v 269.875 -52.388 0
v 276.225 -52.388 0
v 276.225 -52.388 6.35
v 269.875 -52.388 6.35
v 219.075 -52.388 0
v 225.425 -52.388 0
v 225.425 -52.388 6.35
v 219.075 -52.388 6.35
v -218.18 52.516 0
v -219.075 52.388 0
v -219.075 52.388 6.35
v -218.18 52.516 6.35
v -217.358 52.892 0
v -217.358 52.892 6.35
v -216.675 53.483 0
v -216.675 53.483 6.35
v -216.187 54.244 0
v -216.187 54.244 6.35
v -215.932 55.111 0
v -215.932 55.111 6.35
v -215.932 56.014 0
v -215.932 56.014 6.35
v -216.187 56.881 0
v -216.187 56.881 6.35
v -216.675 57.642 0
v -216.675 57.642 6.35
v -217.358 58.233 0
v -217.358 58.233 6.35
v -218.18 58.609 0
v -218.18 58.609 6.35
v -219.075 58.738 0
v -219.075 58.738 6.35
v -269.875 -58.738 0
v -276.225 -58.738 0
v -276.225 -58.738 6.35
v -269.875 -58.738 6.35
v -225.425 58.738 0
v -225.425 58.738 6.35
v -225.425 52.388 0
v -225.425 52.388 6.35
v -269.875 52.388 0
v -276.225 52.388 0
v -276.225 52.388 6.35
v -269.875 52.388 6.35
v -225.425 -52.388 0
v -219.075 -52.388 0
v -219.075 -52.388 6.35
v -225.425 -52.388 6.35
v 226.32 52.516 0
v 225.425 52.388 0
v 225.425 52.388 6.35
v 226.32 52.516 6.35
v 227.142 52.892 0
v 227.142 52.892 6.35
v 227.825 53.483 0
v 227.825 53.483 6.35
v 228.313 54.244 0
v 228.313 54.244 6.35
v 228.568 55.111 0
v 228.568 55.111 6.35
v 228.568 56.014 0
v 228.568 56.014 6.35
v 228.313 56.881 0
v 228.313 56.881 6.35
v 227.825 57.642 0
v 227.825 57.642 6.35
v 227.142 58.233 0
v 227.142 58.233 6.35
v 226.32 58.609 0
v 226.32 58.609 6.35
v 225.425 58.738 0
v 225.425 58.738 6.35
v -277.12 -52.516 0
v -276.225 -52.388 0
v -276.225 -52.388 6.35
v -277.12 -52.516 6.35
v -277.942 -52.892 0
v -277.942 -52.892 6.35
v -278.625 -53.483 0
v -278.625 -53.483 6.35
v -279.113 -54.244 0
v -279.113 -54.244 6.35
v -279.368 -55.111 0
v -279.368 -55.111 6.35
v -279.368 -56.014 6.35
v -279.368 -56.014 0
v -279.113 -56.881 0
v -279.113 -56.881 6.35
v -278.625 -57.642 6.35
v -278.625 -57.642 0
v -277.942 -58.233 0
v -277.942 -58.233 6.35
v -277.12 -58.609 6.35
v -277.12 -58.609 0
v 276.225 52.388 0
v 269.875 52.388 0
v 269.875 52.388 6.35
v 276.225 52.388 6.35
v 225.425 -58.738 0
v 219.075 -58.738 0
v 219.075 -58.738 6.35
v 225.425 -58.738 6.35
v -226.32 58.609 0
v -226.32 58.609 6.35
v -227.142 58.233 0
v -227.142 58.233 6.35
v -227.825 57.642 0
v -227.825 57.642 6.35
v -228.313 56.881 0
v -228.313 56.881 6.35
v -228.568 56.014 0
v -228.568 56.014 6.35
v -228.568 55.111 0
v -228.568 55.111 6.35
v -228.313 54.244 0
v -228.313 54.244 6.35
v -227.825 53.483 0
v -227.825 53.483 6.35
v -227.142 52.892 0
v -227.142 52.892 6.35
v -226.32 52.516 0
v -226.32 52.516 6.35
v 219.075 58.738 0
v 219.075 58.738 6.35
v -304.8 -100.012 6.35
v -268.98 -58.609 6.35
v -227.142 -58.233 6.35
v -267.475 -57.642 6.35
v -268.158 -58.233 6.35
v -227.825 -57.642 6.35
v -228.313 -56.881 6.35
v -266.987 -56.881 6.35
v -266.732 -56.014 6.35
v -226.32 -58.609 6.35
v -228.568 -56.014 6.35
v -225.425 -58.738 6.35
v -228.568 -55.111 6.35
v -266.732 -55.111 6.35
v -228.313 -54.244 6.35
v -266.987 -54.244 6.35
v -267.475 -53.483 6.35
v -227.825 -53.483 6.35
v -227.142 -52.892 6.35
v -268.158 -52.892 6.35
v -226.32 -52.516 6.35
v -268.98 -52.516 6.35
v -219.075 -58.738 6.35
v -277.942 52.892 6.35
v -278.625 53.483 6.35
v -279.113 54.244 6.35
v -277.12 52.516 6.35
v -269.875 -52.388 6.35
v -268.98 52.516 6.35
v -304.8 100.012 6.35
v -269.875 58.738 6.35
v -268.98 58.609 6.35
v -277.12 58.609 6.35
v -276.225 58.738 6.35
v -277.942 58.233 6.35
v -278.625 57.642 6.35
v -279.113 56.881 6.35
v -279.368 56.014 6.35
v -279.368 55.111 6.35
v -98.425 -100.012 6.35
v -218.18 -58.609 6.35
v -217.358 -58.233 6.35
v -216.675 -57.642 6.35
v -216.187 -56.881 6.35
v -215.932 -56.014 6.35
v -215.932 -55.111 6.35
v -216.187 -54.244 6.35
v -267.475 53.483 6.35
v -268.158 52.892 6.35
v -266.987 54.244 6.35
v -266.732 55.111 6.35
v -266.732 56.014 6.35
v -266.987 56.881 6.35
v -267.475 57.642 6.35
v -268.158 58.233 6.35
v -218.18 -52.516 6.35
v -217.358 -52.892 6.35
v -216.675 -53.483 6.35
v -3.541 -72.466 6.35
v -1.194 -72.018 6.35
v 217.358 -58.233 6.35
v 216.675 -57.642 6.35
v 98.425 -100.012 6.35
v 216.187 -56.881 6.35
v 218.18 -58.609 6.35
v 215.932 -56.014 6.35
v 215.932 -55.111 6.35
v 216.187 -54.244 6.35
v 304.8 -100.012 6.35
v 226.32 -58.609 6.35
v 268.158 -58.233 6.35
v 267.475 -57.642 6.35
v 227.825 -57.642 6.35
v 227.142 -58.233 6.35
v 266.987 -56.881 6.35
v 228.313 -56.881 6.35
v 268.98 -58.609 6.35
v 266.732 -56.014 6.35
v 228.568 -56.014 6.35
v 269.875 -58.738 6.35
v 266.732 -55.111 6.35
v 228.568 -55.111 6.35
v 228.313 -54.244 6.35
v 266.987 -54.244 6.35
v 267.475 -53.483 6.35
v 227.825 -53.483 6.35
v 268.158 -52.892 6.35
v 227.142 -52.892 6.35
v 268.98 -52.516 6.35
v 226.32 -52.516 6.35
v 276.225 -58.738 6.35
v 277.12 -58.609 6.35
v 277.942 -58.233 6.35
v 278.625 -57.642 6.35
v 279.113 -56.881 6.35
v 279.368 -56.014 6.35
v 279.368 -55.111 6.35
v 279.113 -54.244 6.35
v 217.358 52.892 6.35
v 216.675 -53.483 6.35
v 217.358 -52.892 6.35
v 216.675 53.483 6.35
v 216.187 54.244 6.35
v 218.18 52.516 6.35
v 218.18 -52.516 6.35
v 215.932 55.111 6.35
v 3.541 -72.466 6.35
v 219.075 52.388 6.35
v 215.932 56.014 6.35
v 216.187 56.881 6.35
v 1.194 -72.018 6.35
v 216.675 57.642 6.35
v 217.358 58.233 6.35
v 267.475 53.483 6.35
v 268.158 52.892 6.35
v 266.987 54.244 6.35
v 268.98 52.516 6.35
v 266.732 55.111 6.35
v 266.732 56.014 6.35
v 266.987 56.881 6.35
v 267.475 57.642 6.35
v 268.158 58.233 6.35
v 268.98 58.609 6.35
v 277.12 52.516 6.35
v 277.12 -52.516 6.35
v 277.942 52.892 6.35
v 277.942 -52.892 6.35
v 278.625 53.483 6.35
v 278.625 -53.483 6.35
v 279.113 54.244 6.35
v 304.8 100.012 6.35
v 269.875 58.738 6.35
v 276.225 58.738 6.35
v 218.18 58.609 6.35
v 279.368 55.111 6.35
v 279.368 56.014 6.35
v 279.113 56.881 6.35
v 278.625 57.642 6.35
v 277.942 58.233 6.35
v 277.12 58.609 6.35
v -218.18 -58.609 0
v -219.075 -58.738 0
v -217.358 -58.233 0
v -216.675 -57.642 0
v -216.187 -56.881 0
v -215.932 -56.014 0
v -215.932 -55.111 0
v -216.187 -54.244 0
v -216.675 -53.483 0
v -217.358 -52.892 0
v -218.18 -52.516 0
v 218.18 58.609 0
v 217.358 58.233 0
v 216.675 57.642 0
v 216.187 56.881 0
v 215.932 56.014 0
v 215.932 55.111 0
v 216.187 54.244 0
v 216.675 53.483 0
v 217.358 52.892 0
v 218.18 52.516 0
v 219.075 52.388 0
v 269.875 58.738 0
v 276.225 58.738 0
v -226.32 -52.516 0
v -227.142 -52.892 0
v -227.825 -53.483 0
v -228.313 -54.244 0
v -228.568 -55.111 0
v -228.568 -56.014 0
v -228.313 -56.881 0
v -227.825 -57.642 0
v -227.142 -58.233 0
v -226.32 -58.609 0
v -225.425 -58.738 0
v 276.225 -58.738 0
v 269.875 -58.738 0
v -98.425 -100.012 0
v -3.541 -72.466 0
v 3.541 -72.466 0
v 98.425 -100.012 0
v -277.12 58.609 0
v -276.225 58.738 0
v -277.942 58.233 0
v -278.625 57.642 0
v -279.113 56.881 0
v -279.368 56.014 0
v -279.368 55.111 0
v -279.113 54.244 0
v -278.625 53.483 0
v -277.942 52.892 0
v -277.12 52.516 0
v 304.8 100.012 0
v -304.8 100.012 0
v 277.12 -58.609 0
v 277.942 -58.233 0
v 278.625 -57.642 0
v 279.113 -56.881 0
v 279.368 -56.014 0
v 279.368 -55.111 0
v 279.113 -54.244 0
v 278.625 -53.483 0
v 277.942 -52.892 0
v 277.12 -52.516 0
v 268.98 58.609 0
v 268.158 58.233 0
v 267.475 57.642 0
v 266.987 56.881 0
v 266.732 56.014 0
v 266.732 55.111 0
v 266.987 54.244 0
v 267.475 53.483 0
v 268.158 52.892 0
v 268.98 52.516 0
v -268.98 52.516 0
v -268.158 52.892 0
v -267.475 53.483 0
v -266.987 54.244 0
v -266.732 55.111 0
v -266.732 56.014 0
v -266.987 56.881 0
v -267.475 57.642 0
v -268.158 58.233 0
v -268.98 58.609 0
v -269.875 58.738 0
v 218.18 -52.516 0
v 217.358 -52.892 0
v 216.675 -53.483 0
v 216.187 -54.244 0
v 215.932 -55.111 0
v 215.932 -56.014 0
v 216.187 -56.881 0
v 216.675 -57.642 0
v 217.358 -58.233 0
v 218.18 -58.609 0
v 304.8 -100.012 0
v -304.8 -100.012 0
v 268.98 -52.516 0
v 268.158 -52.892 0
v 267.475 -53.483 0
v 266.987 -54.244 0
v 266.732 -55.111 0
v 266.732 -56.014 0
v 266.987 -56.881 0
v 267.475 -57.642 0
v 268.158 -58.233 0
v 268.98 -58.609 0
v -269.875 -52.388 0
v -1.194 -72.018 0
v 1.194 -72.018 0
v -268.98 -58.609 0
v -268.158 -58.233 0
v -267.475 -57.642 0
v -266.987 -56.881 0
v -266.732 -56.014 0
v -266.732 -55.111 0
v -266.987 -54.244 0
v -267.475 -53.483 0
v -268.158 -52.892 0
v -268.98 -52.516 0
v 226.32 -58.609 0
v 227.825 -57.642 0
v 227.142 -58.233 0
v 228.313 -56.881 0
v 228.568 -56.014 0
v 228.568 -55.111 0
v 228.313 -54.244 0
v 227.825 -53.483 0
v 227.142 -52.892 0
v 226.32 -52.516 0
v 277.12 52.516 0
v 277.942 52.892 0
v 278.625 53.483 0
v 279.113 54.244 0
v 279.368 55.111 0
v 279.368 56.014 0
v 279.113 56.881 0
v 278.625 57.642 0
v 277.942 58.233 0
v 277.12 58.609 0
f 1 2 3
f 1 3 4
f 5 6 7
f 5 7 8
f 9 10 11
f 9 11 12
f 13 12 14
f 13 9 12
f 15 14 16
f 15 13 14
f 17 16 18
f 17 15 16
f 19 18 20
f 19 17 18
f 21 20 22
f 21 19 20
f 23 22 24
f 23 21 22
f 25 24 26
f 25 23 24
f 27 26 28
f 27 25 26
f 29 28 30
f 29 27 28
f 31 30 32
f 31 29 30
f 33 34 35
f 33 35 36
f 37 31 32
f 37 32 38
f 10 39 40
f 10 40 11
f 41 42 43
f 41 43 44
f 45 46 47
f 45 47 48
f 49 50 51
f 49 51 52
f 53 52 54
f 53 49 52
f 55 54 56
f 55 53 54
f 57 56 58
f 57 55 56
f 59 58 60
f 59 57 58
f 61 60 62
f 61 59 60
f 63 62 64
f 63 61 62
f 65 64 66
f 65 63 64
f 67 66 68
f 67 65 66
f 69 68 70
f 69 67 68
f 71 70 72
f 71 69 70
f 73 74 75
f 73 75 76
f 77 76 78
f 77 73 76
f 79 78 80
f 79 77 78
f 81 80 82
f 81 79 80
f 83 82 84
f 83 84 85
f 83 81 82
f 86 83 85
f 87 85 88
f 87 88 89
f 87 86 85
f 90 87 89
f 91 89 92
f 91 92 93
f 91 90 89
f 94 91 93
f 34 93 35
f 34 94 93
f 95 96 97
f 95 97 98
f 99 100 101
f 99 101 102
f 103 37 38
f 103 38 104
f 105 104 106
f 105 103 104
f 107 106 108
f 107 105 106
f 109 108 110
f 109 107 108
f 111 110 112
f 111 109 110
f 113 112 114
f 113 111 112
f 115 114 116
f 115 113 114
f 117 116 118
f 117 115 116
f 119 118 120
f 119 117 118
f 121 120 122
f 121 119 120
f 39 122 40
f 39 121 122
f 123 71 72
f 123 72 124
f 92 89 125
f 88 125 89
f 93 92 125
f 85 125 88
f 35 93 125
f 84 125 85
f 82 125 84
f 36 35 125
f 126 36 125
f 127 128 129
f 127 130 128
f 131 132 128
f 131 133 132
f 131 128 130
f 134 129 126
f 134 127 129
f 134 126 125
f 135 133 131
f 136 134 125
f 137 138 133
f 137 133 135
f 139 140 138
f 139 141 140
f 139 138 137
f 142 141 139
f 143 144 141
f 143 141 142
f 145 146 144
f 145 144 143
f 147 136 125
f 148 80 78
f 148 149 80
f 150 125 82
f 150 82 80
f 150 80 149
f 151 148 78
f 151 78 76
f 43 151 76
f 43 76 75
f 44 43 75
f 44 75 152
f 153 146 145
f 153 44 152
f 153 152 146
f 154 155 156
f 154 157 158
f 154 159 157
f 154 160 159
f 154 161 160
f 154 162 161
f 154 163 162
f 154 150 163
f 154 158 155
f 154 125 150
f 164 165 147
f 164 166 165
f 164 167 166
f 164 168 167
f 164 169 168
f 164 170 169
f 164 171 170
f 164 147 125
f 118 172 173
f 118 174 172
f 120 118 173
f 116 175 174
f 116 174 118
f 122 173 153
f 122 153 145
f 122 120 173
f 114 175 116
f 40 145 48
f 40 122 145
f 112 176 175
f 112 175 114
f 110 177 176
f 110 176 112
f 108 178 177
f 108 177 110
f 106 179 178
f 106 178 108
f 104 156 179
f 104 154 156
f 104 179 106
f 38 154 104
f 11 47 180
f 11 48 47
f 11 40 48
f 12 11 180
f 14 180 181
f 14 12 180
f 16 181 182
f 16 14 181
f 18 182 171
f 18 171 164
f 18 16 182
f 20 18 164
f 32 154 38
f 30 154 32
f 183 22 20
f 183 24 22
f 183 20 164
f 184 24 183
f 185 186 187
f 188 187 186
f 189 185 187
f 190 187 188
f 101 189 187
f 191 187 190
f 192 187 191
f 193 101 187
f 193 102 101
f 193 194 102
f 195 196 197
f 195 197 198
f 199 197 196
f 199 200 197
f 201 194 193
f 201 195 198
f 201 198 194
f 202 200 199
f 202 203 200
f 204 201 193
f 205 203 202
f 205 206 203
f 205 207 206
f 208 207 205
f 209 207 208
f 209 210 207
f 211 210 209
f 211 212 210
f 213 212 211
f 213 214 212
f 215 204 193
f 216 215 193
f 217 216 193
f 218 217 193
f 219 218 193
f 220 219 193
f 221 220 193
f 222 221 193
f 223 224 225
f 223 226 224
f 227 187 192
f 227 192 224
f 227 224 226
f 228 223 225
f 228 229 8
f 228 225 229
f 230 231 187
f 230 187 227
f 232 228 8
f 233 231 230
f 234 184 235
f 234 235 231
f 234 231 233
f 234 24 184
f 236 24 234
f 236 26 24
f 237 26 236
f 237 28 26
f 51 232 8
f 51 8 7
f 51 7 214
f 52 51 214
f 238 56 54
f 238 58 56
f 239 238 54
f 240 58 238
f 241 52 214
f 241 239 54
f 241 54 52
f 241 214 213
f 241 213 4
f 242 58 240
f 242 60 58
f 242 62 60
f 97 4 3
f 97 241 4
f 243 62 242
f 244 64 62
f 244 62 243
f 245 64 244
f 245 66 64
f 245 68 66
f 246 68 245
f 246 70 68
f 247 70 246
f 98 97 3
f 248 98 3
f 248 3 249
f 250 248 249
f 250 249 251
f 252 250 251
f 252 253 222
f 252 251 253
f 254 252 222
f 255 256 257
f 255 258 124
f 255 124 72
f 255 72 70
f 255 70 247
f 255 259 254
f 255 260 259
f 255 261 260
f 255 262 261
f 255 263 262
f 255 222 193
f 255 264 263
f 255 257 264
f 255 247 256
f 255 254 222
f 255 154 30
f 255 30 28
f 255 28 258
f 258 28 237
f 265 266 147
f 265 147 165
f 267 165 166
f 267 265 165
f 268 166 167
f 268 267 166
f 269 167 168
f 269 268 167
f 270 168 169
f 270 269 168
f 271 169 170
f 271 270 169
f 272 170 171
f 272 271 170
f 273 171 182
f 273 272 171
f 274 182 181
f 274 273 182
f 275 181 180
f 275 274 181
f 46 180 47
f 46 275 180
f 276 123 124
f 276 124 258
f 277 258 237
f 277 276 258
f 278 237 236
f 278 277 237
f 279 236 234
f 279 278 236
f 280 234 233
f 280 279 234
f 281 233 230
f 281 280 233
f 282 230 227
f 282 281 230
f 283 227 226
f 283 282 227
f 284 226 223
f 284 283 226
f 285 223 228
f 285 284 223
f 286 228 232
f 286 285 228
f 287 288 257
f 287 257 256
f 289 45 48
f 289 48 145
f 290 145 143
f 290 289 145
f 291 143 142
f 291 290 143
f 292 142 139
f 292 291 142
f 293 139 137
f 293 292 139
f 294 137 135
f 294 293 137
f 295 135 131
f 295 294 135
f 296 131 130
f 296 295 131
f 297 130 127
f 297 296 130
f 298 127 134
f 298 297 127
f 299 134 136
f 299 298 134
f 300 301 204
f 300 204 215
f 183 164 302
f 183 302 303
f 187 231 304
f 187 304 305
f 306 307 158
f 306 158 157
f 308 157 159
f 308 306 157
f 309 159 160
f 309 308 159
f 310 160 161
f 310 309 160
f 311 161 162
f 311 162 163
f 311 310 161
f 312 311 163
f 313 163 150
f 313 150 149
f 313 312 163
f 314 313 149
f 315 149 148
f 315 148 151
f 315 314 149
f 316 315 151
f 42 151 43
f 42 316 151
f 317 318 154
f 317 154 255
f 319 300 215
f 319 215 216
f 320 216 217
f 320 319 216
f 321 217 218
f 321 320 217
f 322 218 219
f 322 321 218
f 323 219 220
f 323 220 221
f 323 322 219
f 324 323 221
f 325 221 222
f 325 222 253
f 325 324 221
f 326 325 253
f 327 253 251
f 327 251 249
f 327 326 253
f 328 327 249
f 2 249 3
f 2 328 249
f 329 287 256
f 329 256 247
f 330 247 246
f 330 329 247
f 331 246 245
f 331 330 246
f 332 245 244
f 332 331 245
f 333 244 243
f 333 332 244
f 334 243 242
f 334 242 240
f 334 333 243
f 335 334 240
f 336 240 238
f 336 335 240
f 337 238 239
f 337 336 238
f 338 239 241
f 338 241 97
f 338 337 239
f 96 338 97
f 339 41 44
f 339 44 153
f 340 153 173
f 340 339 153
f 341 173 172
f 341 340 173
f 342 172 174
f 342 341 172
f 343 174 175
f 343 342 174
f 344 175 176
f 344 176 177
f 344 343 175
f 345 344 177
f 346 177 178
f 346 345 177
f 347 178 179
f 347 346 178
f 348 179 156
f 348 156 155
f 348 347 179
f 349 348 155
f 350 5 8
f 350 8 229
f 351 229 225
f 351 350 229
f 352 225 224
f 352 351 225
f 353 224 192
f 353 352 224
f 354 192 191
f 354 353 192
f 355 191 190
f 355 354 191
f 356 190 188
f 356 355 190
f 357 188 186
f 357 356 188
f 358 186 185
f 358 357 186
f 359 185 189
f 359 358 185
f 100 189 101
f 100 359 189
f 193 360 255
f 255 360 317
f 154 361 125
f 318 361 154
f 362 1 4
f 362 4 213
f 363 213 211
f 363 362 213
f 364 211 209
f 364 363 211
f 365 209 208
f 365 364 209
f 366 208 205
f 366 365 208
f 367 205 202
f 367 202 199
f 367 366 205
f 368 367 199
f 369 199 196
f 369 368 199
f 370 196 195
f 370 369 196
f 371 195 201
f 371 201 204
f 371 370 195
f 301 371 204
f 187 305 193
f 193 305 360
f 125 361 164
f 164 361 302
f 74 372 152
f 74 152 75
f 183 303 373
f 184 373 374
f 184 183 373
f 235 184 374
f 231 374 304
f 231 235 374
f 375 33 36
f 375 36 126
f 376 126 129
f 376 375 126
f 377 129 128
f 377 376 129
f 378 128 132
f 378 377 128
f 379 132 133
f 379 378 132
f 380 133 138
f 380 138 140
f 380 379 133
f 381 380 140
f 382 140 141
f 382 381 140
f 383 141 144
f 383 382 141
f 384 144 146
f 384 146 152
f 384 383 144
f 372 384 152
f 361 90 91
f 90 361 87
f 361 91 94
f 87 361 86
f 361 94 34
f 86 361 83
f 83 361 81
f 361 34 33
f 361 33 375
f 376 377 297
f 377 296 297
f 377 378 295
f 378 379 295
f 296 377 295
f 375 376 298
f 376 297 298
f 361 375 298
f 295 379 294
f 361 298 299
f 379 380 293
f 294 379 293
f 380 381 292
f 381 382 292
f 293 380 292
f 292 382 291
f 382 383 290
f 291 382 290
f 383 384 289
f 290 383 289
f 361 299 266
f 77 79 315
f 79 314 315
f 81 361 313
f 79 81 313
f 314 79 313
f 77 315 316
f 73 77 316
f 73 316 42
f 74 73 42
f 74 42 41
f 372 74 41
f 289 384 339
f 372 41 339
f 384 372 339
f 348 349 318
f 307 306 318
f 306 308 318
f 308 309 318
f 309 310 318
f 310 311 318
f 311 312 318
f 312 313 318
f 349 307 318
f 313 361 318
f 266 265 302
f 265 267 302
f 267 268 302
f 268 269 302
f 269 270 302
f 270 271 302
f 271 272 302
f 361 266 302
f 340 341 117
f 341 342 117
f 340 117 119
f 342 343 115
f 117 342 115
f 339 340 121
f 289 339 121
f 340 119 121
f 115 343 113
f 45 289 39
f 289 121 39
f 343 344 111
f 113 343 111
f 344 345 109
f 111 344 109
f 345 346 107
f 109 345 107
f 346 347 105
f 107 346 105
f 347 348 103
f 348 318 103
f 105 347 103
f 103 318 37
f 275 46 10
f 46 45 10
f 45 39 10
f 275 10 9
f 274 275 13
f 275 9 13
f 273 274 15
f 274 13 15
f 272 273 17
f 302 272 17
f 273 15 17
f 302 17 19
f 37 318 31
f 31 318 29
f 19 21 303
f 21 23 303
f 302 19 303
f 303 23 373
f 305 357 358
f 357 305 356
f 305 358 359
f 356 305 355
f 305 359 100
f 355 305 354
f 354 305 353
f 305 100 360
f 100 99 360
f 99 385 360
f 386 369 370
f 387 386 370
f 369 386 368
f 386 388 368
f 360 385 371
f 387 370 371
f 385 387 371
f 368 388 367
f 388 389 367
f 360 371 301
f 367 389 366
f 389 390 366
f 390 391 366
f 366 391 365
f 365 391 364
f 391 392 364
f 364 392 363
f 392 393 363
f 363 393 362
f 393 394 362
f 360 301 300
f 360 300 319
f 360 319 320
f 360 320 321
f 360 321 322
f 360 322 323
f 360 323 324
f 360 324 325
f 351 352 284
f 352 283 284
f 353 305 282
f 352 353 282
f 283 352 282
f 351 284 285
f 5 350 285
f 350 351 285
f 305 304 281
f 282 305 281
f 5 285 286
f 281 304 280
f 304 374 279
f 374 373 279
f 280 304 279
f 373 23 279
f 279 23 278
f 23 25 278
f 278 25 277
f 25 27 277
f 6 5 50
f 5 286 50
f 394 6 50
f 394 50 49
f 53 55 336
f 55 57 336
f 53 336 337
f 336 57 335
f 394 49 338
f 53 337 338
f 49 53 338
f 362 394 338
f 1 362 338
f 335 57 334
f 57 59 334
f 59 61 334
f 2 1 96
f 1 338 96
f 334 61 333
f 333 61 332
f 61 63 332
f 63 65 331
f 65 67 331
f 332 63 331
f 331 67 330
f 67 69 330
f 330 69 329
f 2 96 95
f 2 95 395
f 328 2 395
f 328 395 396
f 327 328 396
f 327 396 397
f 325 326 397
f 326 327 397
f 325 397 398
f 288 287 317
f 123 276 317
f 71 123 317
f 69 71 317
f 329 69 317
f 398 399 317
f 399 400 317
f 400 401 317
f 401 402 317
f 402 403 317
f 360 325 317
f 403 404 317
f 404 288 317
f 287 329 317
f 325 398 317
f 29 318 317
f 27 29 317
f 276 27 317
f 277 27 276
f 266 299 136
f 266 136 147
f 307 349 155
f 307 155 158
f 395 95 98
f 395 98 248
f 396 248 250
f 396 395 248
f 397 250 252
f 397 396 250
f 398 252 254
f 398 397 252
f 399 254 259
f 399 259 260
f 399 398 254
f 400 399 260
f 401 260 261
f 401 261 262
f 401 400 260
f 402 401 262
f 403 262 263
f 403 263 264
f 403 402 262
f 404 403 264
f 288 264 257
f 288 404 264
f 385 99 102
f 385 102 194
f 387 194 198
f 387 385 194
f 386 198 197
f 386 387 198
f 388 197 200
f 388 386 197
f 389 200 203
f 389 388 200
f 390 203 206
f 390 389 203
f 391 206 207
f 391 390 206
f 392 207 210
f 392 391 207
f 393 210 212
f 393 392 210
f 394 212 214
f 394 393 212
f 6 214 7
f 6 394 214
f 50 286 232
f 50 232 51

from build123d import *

# Parameters (mm, degrees)
SKETCH1_W                       = 609.6
SKETCH1_H                       = 200.025
BOSS_EXTRUDE1_DEPTH             = 6.35
F_1_4_0_25_DIAMETER_SLOT1_DEPTH = 6.35
CUT_EXTRUDE1_DEPTH              = 321.85177677


# Read off the part's stored shape, not the designer's step: 1/4 (0.25) Diameter Slot1
with BuildPart() as part:
    # Sketch1 → Boss-Extrude1 (new body)
    with BuildSketch(Plane.XY):
        Rectangle(SKETCH1_W, SKETCH1_H)
    extrude(amount=BOSS_EXTRUDE1_DEPTH)

    # 1/4 (0.25) Diameter Slot1 outline → 1/4 (0.25) Diameter Slot1 (cut)
    with BuildSketch(Plane.XY):
        with BuildLine():
            Line((219.075, -58.7375), (225.425, -58.7375))
            ThreePointArc((225.425, -58.7375), (228.6, -55.5625), (225.425, -52.3875))
            Line((225.425, -52.3875), (219.075, -52.3875))
            ThreePointArc((219.075, -52.3875), (215.9, -55.5625), (219.075, -58.7375))
        make_face()
        with BuildLine():
            ThreePointArc((-219.075, -58.7375), (-215.9, -55.5625), (-219.075, -52.3875))
            Line((-219.075, -52.3875), (-225.425, -52.3875))
            ThreePointArc((-225.425, -52.3875), (-228.6, -55.5625), (-225.425, -58.7375))
            Line((-225.425, -58.7375), (-219.075, -58.7375))
        make_face()
        with BuildLine():
            ThreePointArc((276.225, -58.7375), (279.4, -55.5625), (276.225, -52.3875))
            Line((276.225, -52.3875), (269.875, -52.3875))
            ThreePointArc((269.875, -52.3875), (266.7, -55.5625), (269.875, -58.7375))
            Line((269.875, -58.7375), (276.225, -58.7375))
        make_face()
        with BuildLine():
            ThreePointArc((-269.875, -58.7375), (-266.7, -55.5625), (-269.875, -52.3875))
            Line((-269.875, -52.3875), (-276.225, -52.3875))
            ThreePointArc((-276.225, -52.3875), (-279.4, -55.5625), (-276.225, -58.7375))
            Line((-276.225, -58.7375), (-269.875, -58.7375))
        make_face()
        with BuildLine():
            Line((219.075, 52.3875), (225.425, 52.3875))
            ThreePointArc((225.425, 52.3875), (228.6, 55.5625), (225.425, 58.7375))
            Line((225.425, 58.7375), (219.075, 58.7375))
            ThreePointArc((219.075, 58.7375), (215.9, 55.5625), (219.075, 52.3875))
        make_face()
        with BuildLine():
            ThreePointArc((-219.075, 52.3875), (-215.9, 55.5625), (-219.075, 58.7375))
            Line((-219.075, 58.7375), (-225.425, 58.7375))
            ThreePointArc((-225.425, 58.7375), (-228.6, 55.5625), (-225.425, 52.3875))
            Line((-225.425, 52.3875), (-219.075, 52.3875))
        make_face()
        with BuildLine():
            ThreePointArc((276.225, 52.3875), (279.4, 55.5625), (276.225, 58.7375))
            Line((276.225, 58.7375), (269.875, 58.7375))
            ThreePointArc((269.875, 58.7375), (266.7, 55.5625), (269.875, 52.3875))
            Line((269.875, 52.3875), (276.225, 52.3875))
        make_face()
        with BuildLine():
            ThreePointArc((-269.875, 52.3875), (-266.7, 55.5625), (-269.875, 58.7375))
            Line((-269.875, 58.7375), (-276.225, 58.7375))
            ThreePointArc((-276.225, 58.7375), (-279.4, 55.5625), (-276.225, 52.3875))
            Line((-276.225, 52.3875), (-269.875, 52.3875))
        make_face()
    extrude(amount=F_1_4_0_25_DIAMETER_SLOT1_DEPTH, mode=Mode.SUBTRACT)

    # Sketch4 → Cut-Extrude1 (cut, through all)
    with BuildSketch(Plane.XY.offset(6.35)):
        with BuildLine():
            Line((-98.425, -100.0125), (-3.540889475, -72.46550017))
            ThreePointArc((-3.540889475, -72.46550017), (0, -71.96189725), (3.540889475, -72.46550017))
            Line((3.540889475, -72.46550017), (98.425, -100.0125))
            Line((98.425, -100.0125), (-98.425, -100.0125))
        make_face()
    extrude(amount=-CUT_EXTRUDE1_DEPTH, mode=Mode.SUBTRACT)


solid = part.part
